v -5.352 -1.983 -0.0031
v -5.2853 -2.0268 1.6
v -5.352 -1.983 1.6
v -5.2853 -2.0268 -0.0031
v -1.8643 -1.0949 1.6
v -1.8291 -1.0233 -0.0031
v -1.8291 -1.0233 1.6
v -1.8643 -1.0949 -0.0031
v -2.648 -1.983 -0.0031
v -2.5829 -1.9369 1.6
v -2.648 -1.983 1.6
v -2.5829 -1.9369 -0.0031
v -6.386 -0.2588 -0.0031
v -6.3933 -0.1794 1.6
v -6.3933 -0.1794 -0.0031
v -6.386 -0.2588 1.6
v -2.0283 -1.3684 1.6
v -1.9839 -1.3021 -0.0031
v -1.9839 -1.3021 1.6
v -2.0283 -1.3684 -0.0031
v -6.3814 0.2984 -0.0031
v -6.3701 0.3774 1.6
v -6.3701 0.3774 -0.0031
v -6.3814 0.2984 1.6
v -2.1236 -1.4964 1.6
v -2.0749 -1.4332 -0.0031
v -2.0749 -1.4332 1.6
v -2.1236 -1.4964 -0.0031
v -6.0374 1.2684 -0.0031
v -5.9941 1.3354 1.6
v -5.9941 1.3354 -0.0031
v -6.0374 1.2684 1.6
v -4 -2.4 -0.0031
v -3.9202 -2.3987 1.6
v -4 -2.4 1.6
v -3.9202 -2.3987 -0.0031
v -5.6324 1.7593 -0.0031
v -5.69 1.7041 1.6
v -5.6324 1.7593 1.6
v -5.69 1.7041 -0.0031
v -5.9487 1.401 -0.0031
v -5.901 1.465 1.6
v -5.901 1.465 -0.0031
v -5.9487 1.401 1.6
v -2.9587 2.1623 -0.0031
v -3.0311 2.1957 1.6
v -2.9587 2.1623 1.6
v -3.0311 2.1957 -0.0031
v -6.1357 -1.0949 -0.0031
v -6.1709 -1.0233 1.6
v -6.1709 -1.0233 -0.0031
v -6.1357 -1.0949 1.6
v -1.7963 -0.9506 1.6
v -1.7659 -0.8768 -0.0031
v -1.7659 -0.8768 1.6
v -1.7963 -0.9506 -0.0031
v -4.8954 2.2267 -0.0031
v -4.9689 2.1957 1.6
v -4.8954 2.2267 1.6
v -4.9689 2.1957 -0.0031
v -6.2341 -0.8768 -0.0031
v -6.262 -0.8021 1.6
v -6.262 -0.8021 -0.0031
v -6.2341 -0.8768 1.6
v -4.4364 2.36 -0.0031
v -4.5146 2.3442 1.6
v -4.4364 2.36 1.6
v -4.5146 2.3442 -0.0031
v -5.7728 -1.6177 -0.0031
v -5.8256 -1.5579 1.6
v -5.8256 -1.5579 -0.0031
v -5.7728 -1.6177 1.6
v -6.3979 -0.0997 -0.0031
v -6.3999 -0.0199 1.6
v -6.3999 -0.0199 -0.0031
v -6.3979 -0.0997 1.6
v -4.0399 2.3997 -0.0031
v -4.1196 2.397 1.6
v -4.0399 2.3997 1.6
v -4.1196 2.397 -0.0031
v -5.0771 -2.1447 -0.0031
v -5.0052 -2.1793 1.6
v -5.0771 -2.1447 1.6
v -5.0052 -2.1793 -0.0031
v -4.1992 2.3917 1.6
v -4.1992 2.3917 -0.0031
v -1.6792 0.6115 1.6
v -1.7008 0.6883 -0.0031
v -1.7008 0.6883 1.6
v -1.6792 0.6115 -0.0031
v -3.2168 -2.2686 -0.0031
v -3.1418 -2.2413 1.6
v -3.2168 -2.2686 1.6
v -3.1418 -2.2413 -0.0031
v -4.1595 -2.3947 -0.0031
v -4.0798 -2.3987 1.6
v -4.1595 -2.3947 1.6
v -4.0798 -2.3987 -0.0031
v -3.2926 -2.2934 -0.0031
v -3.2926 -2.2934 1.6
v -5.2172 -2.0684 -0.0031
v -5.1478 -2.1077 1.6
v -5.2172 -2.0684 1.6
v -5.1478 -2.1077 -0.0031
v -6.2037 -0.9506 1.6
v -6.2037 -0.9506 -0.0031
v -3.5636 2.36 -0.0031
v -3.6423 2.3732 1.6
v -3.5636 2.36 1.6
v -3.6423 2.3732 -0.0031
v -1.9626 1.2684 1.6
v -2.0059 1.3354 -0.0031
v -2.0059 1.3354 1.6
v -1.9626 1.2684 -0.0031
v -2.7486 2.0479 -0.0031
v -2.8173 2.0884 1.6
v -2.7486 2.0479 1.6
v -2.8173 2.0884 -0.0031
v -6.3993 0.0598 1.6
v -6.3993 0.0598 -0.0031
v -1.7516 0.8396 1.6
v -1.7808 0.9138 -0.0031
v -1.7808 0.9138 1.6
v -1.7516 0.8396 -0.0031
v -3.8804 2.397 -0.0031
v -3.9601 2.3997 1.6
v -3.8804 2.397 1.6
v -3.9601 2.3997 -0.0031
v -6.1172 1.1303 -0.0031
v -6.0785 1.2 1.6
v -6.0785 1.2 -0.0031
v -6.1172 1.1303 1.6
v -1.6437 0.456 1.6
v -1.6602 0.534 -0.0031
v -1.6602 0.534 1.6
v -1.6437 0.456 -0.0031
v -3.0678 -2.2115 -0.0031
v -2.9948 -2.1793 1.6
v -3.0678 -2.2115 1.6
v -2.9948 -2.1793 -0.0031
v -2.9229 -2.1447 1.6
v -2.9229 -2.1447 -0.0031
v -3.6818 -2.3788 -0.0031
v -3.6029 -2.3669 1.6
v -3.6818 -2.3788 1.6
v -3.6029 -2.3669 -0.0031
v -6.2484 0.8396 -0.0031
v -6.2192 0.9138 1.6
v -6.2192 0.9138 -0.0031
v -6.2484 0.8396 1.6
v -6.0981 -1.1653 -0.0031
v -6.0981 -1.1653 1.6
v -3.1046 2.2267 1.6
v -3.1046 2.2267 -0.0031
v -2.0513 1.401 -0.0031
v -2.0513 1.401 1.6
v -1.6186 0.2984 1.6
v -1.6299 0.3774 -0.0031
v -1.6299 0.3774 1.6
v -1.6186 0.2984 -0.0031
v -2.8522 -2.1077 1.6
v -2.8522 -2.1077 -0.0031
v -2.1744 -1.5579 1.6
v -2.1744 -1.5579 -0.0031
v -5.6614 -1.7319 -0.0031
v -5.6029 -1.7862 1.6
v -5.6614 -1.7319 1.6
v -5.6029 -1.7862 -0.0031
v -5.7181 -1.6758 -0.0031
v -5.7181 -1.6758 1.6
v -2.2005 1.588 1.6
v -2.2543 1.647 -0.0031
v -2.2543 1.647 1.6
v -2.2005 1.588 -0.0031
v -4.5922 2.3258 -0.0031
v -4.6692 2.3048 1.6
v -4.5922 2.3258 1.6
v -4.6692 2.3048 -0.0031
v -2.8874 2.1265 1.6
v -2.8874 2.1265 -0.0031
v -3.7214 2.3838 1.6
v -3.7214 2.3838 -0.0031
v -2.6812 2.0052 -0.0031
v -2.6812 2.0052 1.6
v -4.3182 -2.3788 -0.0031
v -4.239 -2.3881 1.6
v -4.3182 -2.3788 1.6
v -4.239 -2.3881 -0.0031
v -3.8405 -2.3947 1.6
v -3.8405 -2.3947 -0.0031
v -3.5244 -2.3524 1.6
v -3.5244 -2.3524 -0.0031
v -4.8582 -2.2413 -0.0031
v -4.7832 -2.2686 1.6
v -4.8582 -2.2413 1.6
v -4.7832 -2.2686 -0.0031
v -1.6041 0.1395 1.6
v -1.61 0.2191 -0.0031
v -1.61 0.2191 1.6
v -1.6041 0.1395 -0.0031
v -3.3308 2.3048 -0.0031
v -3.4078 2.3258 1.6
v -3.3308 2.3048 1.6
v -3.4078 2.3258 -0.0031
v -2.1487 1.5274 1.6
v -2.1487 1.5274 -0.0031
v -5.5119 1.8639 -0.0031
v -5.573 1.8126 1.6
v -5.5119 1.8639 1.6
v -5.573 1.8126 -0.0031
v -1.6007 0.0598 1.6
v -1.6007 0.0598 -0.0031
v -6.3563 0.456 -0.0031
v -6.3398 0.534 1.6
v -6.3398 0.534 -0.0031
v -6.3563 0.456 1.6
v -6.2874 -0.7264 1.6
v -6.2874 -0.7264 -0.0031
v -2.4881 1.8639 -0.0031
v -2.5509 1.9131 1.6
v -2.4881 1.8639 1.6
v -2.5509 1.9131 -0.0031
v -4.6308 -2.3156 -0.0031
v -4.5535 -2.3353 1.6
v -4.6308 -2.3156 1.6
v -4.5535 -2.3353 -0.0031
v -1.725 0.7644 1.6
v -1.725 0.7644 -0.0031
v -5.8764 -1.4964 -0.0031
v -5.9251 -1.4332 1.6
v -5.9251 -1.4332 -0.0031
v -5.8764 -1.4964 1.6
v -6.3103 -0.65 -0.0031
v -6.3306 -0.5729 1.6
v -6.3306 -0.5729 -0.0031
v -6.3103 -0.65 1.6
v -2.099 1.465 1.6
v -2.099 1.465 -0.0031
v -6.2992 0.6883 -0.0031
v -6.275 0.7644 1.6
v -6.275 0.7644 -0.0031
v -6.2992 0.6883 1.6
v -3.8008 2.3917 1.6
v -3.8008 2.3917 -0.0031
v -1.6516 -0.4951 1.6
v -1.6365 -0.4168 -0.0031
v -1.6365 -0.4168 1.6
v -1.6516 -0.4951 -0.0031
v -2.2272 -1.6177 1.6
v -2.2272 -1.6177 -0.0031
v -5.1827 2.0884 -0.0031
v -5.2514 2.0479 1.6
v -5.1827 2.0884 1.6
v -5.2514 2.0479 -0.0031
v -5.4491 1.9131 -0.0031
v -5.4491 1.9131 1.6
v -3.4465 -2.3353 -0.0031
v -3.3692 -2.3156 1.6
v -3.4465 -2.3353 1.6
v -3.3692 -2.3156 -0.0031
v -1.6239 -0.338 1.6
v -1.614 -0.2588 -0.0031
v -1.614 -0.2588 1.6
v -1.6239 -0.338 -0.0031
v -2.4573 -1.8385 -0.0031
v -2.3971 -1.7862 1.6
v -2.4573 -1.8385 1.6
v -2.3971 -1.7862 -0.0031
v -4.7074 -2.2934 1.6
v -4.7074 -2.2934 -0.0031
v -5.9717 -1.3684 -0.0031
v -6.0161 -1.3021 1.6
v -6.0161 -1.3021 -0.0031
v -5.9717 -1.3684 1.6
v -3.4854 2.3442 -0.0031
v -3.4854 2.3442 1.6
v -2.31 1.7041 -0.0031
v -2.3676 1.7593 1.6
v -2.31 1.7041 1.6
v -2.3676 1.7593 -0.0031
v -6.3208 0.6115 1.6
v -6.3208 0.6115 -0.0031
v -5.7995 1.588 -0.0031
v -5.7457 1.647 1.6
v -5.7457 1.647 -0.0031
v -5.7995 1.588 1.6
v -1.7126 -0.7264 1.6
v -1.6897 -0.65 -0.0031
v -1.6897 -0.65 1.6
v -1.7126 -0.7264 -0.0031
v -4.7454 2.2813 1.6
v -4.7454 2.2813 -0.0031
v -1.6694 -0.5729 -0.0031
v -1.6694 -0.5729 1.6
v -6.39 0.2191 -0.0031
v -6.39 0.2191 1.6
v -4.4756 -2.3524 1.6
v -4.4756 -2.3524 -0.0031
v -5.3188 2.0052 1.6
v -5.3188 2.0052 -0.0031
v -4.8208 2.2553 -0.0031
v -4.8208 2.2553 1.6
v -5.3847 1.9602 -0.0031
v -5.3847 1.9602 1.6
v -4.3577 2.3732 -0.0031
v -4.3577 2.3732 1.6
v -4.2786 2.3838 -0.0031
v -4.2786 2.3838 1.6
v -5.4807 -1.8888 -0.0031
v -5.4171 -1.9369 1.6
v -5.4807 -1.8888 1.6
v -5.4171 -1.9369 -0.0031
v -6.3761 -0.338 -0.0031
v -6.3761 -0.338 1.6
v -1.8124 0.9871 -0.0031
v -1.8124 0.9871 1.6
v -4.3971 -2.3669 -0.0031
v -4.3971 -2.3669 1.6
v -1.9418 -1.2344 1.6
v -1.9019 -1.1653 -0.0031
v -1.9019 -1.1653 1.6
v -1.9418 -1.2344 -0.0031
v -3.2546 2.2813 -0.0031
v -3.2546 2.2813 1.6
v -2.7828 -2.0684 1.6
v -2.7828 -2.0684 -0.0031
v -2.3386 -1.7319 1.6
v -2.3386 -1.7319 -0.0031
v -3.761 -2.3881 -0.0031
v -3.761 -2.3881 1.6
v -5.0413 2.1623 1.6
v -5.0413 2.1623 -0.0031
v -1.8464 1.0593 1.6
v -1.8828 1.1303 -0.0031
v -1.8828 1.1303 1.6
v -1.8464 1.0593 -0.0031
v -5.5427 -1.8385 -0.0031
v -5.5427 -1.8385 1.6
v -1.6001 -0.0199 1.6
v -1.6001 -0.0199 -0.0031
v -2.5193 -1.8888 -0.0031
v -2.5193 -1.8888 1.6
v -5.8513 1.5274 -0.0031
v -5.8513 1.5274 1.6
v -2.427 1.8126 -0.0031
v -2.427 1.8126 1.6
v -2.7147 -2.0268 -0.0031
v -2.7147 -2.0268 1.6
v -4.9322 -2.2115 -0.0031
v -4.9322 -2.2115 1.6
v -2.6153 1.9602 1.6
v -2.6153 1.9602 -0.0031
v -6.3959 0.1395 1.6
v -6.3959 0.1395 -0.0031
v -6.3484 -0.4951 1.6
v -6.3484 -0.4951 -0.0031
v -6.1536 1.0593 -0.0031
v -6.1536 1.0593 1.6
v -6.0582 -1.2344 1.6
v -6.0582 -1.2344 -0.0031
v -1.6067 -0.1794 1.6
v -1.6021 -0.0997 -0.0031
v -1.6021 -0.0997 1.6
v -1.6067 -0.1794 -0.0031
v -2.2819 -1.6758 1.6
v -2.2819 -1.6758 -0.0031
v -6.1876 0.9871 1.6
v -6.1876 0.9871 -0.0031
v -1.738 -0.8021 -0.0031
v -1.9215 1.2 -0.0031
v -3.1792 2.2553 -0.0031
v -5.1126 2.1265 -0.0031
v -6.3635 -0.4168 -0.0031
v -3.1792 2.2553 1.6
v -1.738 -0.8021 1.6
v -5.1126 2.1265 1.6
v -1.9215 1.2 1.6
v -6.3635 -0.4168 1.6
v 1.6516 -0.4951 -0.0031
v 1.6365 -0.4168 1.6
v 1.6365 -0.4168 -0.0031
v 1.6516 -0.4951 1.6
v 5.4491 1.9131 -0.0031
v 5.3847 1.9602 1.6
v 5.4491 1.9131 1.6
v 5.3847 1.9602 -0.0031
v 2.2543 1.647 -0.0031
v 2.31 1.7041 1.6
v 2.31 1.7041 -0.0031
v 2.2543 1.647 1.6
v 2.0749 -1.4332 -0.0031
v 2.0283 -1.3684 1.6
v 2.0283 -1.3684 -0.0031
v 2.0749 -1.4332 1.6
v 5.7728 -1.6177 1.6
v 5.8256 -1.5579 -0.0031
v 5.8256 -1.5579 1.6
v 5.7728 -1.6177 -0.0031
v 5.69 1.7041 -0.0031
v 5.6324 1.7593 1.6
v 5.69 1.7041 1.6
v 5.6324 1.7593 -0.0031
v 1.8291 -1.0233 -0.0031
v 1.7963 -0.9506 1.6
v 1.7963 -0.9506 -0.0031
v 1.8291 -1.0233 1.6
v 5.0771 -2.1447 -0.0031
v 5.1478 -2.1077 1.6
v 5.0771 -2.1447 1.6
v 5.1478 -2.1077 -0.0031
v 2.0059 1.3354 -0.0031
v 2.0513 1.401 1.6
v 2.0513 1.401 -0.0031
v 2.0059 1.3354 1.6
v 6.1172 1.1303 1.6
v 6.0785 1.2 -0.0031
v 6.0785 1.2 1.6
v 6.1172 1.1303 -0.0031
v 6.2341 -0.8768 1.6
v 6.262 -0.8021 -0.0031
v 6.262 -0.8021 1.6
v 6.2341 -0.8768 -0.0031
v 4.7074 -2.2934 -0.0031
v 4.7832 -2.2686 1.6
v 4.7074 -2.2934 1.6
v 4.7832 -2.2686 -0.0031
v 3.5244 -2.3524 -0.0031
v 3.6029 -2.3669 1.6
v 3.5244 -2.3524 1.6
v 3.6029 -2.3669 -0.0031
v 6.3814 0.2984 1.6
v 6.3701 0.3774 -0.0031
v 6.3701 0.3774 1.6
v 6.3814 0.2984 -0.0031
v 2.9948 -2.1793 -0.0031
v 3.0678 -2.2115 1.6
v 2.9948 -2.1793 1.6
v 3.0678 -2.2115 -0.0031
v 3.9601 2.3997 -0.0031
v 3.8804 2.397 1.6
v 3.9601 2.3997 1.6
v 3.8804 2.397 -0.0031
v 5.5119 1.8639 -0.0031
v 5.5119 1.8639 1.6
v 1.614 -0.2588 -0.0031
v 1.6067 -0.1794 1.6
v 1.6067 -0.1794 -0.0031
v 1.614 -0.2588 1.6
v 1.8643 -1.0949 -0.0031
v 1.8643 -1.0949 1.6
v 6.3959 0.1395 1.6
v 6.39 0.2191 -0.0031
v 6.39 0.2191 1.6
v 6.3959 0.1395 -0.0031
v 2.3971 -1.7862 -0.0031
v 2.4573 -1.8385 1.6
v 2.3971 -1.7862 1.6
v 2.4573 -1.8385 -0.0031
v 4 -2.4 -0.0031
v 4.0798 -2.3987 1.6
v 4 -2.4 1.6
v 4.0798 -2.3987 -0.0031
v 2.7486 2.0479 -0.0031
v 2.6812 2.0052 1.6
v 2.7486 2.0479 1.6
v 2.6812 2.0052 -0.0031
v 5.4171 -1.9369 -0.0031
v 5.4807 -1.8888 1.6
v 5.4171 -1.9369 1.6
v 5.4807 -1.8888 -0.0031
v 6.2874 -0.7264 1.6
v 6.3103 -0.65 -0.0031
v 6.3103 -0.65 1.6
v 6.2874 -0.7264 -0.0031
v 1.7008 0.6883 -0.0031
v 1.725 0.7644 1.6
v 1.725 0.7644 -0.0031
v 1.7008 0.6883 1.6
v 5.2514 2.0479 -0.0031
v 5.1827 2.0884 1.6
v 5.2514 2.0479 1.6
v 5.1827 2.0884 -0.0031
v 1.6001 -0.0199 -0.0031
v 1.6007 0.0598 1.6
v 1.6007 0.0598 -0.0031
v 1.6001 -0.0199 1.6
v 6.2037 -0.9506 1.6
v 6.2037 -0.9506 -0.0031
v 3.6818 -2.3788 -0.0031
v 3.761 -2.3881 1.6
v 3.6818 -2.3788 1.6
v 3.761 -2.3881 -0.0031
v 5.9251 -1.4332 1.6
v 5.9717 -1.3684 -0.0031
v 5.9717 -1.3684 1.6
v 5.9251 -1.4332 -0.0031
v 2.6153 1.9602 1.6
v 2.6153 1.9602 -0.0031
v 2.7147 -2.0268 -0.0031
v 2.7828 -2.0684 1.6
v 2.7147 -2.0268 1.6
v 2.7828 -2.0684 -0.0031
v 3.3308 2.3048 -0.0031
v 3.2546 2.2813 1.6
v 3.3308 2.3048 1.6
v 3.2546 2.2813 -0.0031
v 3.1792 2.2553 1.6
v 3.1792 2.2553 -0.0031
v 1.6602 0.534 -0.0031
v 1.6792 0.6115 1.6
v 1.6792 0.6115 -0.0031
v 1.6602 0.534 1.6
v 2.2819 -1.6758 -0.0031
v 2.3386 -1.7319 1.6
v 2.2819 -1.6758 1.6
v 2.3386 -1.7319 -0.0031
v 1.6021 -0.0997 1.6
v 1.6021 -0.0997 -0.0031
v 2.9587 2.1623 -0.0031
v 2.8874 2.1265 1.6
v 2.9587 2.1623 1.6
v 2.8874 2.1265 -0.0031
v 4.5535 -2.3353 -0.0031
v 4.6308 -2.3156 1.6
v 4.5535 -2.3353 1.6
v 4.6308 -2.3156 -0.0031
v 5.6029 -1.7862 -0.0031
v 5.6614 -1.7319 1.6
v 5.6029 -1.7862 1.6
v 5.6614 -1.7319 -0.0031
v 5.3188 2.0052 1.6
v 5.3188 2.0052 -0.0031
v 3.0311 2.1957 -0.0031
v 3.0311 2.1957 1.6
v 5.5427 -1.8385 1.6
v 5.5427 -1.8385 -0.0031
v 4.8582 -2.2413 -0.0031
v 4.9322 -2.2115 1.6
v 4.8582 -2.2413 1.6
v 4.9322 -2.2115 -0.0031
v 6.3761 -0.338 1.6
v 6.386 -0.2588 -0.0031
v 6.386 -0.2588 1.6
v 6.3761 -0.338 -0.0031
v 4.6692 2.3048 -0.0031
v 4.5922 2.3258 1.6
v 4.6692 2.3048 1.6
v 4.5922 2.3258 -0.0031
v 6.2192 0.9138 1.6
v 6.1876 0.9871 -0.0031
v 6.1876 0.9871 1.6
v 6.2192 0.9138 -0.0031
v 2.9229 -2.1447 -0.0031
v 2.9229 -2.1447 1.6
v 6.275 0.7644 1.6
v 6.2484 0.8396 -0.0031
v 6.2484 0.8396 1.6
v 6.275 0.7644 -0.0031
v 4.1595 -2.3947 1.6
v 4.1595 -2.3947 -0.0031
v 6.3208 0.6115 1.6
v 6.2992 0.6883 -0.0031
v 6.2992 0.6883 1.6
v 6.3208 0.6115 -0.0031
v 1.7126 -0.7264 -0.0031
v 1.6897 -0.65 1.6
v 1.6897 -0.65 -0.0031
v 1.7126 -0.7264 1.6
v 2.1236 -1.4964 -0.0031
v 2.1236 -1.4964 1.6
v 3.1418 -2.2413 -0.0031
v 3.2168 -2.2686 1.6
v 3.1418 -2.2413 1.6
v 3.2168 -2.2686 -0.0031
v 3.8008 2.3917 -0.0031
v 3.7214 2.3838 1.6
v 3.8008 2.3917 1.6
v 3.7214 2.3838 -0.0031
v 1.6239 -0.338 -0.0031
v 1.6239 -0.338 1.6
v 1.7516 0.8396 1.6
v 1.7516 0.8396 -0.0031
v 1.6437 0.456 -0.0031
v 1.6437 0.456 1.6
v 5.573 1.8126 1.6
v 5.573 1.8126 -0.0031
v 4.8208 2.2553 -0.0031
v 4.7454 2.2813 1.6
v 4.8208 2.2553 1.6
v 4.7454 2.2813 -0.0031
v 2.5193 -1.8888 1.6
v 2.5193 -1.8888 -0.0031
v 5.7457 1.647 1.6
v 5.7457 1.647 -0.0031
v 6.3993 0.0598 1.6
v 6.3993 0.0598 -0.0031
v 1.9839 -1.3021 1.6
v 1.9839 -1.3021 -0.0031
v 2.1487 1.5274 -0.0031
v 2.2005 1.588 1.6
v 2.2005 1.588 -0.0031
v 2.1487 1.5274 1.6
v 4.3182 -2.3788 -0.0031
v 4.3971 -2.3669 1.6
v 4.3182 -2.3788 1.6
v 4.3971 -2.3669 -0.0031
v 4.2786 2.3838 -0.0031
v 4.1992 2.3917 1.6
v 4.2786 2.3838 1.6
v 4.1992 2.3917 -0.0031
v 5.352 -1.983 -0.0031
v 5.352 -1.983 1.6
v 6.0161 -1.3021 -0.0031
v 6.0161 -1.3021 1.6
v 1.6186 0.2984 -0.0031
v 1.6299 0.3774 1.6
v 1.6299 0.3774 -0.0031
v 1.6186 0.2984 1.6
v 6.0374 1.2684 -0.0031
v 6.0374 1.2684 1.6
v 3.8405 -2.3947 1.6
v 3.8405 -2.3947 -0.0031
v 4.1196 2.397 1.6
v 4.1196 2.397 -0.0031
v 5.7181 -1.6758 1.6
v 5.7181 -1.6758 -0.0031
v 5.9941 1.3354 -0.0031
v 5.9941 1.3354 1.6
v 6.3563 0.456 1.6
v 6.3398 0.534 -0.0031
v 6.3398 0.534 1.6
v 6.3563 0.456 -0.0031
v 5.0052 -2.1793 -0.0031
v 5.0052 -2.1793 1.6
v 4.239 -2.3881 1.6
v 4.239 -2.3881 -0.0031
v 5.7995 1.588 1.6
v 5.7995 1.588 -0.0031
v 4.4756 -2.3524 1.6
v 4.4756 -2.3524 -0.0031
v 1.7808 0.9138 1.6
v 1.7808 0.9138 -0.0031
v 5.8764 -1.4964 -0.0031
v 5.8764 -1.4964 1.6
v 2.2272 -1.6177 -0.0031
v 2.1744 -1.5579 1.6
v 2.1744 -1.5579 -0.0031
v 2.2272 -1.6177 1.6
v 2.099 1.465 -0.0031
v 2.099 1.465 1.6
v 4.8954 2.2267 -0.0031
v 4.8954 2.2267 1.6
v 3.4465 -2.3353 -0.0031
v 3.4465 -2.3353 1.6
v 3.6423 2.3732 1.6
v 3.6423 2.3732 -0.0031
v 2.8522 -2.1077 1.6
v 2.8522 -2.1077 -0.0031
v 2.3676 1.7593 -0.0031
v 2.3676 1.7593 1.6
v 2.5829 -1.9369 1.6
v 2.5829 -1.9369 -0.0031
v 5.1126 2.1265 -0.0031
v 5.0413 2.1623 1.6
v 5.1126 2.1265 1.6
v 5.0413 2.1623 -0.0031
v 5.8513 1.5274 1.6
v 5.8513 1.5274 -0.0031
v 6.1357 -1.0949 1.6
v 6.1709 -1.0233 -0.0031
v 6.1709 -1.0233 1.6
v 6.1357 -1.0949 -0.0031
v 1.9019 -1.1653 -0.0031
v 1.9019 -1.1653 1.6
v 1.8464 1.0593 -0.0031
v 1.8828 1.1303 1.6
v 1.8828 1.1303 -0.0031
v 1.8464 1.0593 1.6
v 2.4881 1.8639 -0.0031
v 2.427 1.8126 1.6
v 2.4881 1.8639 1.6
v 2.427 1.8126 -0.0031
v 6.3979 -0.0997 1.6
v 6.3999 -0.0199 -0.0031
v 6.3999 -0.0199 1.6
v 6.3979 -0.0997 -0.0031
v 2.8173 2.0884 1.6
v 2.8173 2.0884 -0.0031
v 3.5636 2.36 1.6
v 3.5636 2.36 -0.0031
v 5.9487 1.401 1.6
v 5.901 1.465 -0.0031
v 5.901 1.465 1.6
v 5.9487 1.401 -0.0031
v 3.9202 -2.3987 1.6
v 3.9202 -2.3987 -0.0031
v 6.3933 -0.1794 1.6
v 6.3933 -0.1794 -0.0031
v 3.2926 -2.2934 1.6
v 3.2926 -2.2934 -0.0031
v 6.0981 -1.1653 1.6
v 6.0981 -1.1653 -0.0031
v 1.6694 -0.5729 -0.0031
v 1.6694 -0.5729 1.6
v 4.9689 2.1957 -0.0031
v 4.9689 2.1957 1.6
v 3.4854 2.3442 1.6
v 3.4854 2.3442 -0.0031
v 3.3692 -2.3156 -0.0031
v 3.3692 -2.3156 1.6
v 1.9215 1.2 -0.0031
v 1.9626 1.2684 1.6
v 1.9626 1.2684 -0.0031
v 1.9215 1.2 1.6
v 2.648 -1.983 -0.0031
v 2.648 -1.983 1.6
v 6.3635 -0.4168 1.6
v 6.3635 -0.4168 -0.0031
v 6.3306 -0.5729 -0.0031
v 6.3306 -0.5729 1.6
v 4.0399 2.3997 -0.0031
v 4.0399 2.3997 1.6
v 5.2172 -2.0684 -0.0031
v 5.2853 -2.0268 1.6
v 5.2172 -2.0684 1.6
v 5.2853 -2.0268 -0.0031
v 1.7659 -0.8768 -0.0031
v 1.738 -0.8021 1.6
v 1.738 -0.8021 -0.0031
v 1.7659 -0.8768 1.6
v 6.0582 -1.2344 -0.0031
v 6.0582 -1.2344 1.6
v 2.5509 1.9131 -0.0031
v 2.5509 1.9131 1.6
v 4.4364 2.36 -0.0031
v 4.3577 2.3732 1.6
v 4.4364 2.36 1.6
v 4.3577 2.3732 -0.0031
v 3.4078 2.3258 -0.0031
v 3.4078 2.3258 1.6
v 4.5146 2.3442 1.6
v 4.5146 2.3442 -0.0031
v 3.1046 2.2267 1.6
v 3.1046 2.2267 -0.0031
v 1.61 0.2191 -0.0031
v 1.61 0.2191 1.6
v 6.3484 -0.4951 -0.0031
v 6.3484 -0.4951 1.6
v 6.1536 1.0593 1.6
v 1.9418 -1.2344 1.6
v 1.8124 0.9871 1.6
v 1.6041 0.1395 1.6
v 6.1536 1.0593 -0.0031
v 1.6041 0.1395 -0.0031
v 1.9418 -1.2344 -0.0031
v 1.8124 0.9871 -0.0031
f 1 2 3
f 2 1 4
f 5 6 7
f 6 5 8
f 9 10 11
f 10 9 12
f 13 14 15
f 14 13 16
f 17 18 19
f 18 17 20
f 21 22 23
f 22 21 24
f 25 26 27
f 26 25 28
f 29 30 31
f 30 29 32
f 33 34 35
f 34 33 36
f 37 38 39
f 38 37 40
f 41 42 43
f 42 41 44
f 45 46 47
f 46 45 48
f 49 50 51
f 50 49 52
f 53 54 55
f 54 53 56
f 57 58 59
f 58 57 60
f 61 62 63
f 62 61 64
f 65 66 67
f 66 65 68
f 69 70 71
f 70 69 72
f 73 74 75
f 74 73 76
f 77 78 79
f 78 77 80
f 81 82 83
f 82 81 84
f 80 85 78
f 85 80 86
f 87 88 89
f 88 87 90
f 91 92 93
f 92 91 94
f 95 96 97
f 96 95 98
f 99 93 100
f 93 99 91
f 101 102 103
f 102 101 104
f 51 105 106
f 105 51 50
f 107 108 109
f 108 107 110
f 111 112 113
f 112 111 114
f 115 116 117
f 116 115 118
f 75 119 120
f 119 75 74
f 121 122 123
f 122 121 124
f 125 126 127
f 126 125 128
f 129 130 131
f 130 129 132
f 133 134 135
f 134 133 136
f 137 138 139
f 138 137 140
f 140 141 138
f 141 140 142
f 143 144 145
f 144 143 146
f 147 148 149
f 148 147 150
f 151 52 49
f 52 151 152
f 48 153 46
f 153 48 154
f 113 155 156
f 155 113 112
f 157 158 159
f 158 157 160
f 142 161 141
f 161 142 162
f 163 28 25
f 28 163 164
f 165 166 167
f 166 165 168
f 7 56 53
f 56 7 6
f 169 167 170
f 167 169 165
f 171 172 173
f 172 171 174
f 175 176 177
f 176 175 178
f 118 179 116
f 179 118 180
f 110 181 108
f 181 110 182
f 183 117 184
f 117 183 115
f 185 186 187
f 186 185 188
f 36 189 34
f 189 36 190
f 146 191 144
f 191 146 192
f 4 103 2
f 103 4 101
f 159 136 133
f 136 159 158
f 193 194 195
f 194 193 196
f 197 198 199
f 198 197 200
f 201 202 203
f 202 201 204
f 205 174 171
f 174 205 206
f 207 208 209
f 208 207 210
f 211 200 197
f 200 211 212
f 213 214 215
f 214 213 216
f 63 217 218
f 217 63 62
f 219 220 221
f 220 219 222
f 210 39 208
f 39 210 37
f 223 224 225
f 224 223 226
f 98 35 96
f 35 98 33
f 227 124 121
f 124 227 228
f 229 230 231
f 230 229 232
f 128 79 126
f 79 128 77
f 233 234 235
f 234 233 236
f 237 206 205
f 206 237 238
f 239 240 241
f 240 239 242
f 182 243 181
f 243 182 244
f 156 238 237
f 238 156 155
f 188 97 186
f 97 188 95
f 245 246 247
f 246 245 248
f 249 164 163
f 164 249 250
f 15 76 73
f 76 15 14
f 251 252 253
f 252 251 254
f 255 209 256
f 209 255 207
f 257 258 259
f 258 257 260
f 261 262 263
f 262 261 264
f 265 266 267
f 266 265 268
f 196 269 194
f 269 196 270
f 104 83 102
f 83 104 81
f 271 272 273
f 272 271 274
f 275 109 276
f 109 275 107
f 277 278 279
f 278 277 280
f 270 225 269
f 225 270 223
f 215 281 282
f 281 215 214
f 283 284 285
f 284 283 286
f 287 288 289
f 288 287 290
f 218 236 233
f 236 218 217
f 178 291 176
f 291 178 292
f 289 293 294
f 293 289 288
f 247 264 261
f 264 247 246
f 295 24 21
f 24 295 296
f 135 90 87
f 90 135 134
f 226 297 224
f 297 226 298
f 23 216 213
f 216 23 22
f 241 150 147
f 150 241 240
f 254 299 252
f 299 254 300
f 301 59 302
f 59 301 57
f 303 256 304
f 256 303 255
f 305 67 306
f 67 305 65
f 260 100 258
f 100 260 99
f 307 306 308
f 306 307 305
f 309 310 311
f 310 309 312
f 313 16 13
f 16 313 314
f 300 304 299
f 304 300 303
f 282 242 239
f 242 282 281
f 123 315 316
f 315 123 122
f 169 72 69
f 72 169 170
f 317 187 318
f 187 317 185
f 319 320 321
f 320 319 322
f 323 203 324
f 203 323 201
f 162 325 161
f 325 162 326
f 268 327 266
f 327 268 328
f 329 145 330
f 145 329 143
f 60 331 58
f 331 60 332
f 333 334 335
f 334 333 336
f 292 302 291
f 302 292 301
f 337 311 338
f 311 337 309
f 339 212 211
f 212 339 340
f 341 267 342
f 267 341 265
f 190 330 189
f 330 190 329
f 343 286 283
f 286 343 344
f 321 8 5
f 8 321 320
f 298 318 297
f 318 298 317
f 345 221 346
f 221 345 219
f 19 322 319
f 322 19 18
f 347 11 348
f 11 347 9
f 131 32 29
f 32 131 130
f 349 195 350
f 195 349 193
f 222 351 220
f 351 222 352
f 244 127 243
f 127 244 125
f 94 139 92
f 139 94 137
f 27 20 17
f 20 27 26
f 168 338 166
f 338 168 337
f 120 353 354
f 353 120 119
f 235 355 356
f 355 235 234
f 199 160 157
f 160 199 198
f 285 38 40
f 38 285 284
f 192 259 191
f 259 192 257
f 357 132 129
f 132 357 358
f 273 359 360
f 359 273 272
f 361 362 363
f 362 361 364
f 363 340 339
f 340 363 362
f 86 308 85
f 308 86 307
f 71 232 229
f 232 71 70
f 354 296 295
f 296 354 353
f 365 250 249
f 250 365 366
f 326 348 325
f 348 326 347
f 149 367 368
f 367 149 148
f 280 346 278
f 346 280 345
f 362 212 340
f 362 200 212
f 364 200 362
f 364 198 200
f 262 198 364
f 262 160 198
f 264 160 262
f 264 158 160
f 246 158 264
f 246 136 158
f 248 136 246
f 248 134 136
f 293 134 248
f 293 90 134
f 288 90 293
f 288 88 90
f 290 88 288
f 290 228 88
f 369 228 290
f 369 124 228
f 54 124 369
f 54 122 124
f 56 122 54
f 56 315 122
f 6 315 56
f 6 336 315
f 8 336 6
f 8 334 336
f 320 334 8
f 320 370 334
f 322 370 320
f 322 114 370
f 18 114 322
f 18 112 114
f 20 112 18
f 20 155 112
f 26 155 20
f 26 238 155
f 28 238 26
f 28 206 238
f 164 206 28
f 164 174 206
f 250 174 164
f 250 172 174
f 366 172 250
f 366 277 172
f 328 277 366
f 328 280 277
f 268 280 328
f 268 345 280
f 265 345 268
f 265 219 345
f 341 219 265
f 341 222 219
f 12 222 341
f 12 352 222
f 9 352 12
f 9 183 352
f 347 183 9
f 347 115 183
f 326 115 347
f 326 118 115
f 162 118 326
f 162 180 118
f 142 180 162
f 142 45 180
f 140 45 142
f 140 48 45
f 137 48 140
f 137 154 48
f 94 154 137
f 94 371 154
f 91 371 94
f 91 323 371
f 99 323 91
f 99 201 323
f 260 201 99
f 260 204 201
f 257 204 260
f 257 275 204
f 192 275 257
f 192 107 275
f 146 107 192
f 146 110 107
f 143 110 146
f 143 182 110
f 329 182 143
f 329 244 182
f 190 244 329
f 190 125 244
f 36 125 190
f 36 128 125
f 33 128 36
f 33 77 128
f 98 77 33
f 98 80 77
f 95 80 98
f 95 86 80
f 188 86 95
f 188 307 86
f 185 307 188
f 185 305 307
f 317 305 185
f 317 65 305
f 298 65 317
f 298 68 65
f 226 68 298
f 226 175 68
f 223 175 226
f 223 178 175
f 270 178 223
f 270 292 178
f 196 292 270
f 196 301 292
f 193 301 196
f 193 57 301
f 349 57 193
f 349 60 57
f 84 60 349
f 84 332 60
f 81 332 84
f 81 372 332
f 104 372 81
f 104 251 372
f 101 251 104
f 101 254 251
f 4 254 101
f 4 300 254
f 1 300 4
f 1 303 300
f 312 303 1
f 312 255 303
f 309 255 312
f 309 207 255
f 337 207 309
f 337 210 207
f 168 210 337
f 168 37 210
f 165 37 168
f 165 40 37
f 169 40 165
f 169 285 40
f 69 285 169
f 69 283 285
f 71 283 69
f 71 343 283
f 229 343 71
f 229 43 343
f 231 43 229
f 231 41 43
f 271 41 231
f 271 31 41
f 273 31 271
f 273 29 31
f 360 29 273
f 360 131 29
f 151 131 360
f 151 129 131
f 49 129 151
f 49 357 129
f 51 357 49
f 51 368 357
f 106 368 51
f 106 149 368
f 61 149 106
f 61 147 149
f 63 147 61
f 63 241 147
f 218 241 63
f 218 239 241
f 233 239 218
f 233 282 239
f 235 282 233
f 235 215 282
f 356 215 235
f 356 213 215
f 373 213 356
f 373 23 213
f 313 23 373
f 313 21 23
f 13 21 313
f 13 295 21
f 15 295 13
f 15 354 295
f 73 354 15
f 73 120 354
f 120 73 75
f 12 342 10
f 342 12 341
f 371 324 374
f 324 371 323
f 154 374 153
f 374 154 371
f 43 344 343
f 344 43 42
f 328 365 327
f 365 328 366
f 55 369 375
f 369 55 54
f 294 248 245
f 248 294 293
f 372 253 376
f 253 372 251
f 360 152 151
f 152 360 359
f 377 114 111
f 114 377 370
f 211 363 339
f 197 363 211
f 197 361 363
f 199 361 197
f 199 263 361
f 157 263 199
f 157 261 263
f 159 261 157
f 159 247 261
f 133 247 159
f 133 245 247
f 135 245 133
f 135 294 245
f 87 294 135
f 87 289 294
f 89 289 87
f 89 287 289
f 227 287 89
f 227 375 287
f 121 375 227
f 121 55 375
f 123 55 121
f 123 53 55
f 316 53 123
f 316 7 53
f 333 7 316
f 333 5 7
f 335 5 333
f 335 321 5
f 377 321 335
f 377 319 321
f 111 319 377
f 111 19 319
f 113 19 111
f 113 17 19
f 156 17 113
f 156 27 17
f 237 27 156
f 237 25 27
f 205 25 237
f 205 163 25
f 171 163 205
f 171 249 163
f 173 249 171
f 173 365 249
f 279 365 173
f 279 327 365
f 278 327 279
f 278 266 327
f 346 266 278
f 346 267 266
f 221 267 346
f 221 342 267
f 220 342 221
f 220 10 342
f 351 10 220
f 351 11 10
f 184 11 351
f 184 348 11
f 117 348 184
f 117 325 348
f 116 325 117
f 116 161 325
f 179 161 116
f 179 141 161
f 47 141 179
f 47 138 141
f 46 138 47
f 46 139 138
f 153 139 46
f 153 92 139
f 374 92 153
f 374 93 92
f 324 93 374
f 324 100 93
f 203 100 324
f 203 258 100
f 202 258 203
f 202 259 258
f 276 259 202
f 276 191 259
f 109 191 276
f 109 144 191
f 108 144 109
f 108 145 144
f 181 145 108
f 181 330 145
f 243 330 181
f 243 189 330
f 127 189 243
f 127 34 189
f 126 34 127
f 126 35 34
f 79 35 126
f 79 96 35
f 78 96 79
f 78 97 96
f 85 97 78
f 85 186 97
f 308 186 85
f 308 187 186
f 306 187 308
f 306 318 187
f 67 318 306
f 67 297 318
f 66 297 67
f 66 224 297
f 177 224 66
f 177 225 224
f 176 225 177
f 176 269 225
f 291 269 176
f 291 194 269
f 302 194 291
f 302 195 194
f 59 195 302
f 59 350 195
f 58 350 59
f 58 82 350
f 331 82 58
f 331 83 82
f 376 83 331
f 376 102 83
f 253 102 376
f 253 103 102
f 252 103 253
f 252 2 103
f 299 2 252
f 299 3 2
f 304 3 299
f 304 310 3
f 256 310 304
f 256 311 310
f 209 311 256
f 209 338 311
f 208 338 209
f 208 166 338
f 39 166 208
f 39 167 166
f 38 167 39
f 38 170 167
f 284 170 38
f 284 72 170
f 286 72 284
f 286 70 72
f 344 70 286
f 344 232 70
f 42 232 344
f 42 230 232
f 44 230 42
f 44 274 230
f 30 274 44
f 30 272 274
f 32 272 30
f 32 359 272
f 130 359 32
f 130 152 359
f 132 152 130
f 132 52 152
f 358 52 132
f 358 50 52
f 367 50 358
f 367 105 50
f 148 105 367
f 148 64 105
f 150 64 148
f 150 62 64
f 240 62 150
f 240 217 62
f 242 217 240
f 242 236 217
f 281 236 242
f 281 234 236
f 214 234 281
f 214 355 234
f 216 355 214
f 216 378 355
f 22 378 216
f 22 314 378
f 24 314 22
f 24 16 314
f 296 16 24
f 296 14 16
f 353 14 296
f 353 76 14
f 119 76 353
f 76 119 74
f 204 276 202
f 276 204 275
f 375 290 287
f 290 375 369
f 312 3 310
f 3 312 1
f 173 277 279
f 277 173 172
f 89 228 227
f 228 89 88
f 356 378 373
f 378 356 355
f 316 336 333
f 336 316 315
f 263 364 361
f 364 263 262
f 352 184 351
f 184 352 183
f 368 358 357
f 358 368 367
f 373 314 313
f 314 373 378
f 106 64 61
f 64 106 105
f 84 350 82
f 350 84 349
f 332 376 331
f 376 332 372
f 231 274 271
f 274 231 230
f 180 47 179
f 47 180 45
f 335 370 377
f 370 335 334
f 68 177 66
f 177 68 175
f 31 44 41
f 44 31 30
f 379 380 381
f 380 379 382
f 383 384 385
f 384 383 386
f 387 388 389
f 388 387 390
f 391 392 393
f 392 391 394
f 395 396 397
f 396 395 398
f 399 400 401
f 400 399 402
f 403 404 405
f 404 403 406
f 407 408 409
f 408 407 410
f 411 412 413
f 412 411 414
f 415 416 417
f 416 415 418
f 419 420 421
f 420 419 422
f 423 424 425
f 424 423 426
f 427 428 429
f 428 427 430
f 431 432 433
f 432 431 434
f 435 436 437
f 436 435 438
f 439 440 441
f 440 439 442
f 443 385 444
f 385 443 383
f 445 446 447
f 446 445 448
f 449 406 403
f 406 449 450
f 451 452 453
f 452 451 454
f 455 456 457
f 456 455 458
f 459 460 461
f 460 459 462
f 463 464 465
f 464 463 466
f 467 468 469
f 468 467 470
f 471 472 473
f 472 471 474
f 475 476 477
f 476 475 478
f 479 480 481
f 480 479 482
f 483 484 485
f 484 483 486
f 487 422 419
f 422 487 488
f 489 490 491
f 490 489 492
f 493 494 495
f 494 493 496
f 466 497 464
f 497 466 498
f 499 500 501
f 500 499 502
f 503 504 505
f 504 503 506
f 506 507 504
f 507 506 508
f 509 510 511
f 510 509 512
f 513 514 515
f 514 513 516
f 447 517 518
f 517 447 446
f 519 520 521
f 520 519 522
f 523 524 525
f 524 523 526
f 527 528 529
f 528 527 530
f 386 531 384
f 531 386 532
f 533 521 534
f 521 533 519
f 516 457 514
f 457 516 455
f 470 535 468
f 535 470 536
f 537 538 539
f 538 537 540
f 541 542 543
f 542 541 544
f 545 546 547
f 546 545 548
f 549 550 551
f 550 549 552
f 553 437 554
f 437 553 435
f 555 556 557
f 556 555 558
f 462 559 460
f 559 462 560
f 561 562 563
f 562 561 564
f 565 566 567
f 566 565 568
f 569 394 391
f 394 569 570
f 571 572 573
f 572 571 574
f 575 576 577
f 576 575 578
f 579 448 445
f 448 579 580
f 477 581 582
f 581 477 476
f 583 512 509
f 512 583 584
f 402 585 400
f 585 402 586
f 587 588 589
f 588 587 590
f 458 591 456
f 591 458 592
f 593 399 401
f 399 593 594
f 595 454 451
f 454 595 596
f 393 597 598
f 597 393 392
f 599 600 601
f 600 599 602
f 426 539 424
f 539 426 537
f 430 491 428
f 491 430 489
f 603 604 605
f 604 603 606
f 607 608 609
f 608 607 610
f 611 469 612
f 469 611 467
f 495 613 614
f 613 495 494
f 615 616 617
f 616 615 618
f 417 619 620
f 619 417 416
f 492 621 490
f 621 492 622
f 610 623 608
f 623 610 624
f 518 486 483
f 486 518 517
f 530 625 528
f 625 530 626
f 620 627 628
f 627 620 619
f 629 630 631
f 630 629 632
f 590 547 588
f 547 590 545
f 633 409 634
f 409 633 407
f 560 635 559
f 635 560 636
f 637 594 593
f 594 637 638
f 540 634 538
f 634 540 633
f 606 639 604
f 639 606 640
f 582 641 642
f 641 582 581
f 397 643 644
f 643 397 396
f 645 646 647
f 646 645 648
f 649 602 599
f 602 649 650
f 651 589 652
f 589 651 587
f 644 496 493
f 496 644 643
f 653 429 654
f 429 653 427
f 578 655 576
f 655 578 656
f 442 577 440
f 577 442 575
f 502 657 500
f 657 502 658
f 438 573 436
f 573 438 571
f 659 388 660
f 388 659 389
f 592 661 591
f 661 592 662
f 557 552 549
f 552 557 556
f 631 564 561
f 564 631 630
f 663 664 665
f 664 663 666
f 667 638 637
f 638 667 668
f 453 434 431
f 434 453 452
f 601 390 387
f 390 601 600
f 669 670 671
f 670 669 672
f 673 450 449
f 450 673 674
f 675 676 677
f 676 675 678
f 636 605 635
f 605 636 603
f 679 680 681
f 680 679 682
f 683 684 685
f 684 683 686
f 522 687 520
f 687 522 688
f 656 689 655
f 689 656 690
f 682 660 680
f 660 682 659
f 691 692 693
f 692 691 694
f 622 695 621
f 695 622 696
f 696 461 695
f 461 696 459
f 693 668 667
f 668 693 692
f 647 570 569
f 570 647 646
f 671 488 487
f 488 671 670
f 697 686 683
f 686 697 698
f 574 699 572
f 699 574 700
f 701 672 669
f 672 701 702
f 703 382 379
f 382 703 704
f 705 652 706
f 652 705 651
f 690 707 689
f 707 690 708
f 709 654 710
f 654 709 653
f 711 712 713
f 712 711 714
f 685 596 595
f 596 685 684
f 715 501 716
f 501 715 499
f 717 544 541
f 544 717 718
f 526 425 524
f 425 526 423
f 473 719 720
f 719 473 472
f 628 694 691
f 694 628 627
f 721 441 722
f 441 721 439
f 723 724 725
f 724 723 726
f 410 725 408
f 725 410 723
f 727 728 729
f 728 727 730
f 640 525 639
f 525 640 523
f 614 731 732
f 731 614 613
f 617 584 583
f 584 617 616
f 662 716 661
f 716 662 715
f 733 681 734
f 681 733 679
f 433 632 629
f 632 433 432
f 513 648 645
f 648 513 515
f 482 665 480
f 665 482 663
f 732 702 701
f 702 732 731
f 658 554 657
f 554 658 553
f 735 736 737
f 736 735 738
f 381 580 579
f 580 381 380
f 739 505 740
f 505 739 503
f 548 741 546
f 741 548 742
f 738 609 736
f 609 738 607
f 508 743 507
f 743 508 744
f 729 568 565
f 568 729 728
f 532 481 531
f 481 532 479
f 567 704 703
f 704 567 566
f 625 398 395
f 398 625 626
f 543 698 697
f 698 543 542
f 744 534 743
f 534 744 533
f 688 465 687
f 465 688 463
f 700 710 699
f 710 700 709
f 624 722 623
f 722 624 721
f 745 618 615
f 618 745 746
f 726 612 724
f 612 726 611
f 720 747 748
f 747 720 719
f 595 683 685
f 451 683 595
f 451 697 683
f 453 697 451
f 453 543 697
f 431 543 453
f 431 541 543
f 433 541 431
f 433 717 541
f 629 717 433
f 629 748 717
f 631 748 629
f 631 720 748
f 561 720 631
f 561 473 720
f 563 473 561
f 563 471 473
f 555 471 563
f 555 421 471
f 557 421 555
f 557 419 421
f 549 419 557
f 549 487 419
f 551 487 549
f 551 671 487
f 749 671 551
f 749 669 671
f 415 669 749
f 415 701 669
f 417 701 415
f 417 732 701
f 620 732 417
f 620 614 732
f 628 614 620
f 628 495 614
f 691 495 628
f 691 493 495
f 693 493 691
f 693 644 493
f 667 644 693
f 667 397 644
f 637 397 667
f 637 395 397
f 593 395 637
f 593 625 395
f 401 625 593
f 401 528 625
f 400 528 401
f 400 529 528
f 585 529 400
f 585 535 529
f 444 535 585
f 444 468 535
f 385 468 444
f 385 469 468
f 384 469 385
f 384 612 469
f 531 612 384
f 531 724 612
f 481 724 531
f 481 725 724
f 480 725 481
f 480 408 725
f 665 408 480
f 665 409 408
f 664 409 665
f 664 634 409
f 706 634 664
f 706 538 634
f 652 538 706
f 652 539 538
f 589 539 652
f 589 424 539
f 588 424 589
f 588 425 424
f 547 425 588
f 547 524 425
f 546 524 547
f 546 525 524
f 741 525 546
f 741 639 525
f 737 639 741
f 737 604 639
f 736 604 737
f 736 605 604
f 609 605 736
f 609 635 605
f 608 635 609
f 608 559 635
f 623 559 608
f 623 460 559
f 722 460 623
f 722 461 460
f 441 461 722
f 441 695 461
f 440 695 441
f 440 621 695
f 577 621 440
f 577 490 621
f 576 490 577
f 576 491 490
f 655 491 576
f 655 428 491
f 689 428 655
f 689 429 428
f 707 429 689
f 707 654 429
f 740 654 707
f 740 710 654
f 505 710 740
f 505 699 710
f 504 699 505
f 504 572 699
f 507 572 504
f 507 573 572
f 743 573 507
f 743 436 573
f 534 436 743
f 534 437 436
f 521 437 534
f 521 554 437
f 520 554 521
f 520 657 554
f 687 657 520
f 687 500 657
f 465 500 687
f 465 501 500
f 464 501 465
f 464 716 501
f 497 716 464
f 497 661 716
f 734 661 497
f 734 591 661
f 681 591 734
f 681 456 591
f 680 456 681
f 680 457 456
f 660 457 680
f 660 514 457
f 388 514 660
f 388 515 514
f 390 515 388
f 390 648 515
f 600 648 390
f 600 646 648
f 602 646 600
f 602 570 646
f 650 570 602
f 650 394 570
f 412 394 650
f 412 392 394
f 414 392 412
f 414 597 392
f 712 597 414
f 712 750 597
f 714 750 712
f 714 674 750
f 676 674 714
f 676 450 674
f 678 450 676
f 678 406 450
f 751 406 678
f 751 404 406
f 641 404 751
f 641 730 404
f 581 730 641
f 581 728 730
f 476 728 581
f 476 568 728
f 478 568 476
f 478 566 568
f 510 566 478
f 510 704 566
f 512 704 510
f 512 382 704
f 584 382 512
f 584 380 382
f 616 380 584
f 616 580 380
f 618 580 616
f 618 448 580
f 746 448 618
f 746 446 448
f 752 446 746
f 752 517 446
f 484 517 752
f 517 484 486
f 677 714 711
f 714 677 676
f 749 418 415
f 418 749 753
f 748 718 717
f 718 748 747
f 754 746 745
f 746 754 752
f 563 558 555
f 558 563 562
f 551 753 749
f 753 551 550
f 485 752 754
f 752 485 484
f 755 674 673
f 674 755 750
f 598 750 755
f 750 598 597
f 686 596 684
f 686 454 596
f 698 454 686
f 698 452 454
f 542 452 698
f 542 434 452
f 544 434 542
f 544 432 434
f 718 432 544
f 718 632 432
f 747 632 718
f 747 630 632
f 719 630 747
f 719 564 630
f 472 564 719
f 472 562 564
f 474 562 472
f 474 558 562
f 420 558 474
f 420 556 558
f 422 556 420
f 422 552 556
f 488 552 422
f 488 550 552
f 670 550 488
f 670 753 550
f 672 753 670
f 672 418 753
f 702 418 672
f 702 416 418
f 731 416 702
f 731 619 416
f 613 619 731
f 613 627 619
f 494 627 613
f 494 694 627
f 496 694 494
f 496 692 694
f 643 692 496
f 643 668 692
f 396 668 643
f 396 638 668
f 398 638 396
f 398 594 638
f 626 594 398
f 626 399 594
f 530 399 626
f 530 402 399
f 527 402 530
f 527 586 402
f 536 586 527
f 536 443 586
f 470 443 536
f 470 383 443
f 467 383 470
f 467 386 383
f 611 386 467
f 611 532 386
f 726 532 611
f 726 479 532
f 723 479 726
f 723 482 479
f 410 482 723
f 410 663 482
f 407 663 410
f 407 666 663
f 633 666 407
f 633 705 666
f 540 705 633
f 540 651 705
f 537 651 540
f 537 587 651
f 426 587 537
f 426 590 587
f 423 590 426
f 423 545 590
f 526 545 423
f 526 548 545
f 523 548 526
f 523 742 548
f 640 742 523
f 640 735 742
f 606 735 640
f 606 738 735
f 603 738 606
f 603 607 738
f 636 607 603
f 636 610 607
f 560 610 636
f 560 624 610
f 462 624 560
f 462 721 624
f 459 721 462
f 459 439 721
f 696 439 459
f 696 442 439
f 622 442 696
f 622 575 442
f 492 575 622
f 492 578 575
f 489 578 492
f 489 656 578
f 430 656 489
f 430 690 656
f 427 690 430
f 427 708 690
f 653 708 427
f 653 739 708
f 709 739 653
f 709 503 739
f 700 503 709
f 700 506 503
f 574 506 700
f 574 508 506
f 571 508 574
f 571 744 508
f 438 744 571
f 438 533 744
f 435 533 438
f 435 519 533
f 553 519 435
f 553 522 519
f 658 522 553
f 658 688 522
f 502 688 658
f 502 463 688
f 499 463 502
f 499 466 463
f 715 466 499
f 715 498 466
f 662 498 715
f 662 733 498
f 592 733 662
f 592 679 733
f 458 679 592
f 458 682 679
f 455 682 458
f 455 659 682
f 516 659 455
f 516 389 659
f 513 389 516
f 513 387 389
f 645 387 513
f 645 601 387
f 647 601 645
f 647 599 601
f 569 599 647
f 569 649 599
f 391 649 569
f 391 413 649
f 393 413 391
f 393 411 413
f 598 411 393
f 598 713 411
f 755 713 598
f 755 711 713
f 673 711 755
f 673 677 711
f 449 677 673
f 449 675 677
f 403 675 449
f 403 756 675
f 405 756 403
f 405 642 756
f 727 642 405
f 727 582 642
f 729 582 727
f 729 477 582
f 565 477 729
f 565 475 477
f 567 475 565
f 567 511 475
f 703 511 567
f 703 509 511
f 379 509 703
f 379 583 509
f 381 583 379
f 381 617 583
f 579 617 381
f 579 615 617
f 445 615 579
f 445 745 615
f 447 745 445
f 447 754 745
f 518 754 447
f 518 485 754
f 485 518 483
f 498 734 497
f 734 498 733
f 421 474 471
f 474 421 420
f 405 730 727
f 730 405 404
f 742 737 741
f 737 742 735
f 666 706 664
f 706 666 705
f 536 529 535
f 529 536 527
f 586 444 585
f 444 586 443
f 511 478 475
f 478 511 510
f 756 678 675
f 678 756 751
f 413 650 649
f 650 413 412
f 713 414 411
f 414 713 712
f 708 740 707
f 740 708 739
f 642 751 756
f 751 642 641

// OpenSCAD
use <../lib.scad>
use <3039.scad>
$fa=1; $fs=0.2;
function ldraw_lib__63341(realsolid=false) = [
// 0 =Slope Brick 45  2 x  2
// 0 Name: 63341.dat
// 0 Author: Rolf Osterthun [Rolf]
// 0 !LDRAW_ORG Part Alias UPDATE 2013-02
// 0 !LICENSE Licensed under CC BY 2.0 and CC BY 4.0 : see CAreadme.txt
// 
// 0 BFC CERTIFY CCW
  [0,"BFC","CERTIFY"],
  [0,"BFC","CCW"],
// 
// 0 !HISTORY 2013-12-23 [PTadmin] Official Update 2013-02
// 
// 
// 0 // Alias of 3039
// 0 // Part 63341 is the metallic lacquered counterpart of 3039
// 
// 1 16 0 0 0 1 0 0 0 1 0 0 0 1 3039.dat
  [1,16,0,0,0,1,0,0,0,1,0,0,0,1, ldraw_lib__3039(realsolid)],
];
module ldraw_lib__63341(step=0, col=false, unit=2/5, alt=false, line=0.2, solid=!$preview)
    makepoly(ldraw_lib__63341(solid), step=step, col=col, unit=unit, alt=alt, line=line, solid=solid);
ldraw_lib__63341(line=0.2);
